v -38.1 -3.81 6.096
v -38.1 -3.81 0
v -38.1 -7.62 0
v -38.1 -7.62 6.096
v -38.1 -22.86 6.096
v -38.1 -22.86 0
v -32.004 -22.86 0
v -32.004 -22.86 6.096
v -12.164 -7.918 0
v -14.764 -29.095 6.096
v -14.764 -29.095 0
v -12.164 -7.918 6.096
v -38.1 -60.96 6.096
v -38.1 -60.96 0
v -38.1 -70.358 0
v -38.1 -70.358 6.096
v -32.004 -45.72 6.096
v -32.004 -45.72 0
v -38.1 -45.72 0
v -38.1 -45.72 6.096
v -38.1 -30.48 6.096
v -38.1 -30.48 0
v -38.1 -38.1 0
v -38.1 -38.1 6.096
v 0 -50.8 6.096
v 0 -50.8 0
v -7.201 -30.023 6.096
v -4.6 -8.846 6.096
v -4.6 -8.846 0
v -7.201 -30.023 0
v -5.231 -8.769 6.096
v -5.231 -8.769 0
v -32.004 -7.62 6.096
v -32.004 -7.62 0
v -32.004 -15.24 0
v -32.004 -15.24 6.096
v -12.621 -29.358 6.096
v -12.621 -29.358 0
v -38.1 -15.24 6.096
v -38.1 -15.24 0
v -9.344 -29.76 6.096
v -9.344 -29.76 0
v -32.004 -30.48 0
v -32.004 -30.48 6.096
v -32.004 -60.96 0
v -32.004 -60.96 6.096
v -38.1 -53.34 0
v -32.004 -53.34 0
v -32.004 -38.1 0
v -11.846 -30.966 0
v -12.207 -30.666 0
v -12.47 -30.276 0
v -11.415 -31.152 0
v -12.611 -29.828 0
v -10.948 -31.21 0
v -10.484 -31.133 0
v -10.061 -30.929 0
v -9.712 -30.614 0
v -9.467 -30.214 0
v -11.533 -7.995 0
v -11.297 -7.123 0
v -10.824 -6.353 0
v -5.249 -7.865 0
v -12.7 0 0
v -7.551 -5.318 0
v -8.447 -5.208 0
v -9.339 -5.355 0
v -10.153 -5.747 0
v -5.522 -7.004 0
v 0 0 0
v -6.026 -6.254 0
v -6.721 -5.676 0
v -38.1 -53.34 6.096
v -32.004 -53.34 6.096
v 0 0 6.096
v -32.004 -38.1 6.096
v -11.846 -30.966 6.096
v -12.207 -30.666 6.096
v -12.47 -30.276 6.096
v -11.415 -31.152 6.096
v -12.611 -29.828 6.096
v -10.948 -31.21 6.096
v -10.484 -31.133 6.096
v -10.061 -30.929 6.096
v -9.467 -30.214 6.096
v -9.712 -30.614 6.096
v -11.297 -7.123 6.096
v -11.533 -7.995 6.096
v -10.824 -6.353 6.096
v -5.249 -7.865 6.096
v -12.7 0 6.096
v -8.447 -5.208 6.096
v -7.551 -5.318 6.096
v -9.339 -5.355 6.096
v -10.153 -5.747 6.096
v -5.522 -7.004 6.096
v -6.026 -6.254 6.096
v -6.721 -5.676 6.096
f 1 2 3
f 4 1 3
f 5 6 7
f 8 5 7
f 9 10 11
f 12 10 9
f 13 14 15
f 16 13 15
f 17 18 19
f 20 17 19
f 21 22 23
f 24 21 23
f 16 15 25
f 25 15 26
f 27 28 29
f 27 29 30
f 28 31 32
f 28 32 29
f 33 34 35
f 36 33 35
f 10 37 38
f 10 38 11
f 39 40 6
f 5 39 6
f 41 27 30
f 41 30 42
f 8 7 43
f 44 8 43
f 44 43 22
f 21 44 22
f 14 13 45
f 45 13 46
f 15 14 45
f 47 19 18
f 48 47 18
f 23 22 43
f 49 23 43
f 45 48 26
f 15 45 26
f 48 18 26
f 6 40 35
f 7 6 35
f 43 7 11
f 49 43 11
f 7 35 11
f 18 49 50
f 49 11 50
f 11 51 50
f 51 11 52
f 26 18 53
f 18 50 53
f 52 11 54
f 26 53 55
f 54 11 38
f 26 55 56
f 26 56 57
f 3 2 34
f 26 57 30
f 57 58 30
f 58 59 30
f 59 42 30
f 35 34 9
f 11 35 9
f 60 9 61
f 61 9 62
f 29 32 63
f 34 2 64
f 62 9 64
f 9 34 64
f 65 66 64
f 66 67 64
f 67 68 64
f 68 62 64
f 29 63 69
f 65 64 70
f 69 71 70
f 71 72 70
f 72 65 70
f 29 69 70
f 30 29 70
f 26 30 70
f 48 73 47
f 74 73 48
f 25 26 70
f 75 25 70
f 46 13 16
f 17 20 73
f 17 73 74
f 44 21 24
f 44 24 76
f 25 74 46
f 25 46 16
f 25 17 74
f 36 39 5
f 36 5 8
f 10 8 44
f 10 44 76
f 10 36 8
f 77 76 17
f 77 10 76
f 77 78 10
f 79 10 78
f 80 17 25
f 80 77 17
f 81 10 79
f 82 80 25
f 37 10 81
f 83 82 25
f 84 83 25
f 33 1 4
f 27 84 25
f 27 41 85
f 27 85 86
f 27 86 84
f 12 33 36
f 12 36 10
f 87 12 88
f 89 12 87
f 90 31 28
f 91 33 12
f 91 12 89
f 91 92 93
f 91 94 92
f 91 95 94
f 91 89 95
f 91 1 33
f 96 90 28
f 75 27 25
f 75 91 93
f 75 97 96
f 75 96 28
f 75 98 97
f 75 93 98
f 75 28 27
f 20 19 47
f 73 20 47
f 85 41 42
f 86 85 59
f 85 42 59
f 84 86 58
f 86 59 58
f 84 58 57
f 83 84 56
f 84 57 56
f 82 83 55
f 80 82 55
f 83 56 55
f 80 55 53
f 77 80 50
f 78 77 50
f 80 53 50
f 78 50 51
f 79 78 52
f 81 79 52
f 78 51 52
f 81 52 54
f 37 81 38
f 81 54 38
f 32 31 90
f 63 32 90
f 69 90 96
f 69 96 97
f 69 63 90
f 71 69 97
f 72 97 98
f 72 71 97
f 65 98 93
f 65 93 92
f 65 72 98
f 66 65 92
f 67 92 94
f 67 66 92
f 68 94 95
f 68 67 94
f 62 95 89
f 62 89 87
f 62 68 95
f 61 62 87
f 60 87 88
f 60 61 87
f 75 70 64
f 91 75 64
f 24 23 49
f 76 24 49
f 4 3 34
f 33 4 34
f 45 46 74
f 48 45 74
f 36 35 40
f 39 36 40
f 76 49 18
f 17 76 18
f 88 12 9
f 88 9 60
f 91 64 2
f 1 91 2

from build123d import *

# Parameters (mm, degrees)
SKETCH1_R           = 3.175
BOSS_EXTRUDE1_DEPTH = 6.096
CUT_EXTRUDE1_DEPTH  = 8.636
SKETCH4_W           = 6.096
SKETCH4_H           = 7.62
CUT_EXTRUDE2_DEPTH  = 81.243500547
SKETCH5_R           = 1.651
CUT_EXTRUDE4_DEPTH  = 6.096
CUT_EXTRUDE5_DEPTH  = 6.096


with BuildPart() as part:
    # Sketch1 → Boss-Extrude1 (new body)
    with BuildSketch(Plane.XY):
        Polygon((0, 0), (-38.1, 0), (-38.1, -7.62), (-32.004, -7.62), (-32.004, -15.24), (-38.1, -15.24), (-38.1, -22.86), (-32.004, -22.86), (-32.004, -30.48), (-38.1, -30.48), (-38.1, -38.1), (-32.004, -38.1), (-32.004, -45.72), (-38.1, -45.72), (-38.1, -70.358), (0, -50.8), align=None)
        with Locations(Location((-8.382, -8.382, 0), (0, 0, 180))):
            Circle(SKETCH1_R, mode=Mode.SUBTRACT)
    extrude(amount=BOSS_EXTRUDE1_DEPTH)

    # Sketch2 → Cut-Extrude1 (cut)
    with BuildSketch(Plane(origin=(0, 0, 0), x_dir=(-1, 0, 0), z_dir=(0, 0, -1))):
        Polygon((38.1, 0), (12.7, 0), (38.1, -3.81), align=None)
    extrude(amount=-CUT_EXTRUDE1_DEPTH, mode=Mode.SUBTRACT)

    # Sketch4 → Cut-Extrude2 (cut, through all)
    with BuildSketch(Plane.XY.offset(6.096)):
        with Locations((-35.052, -57.15)):
            Rectangle(SKETCH4_W, SKETCH4_H)
    extrude(amount=-CUT_EXTRUDE2_DEPTH, mode=Mode.SUBTRACT)

    # Sketch5 → Cut-Extrude4 (cut)
    with BuildSketch(Plane(origin=(0, 0, 0), x_dir=(-1, 0, 0), z_dir=(0, 0, -1))):
        with Locations((10.982204311, -29.558964691)):
            Circle(SKETCH5_R)
    extrude(amount=-CUT_EXTRUDE4_DEPTH, mode=Mode.SUBTRACT)

    # Sketch6 → Cut-Extrude5 (cut)
    with BuildSketch(Plane.XY.offset(6.096)):
        Polygon((-5.230665969, -8.768935165), (-4.600399162, -8.846322198), (-7.200603473, -30.02328689), (-9.343510615, -29.760170977), (-12.620898007, -29.357758405), (-14.763805149, -29.094642493), (-12.163600838, -7.917677802), (-11.533334031, -7.995064835), align=None)
    extrude(amount=-CUT_EXTRUDE5_DEPTH, mode=Mode.SUBTRACT)


solid = part.part
